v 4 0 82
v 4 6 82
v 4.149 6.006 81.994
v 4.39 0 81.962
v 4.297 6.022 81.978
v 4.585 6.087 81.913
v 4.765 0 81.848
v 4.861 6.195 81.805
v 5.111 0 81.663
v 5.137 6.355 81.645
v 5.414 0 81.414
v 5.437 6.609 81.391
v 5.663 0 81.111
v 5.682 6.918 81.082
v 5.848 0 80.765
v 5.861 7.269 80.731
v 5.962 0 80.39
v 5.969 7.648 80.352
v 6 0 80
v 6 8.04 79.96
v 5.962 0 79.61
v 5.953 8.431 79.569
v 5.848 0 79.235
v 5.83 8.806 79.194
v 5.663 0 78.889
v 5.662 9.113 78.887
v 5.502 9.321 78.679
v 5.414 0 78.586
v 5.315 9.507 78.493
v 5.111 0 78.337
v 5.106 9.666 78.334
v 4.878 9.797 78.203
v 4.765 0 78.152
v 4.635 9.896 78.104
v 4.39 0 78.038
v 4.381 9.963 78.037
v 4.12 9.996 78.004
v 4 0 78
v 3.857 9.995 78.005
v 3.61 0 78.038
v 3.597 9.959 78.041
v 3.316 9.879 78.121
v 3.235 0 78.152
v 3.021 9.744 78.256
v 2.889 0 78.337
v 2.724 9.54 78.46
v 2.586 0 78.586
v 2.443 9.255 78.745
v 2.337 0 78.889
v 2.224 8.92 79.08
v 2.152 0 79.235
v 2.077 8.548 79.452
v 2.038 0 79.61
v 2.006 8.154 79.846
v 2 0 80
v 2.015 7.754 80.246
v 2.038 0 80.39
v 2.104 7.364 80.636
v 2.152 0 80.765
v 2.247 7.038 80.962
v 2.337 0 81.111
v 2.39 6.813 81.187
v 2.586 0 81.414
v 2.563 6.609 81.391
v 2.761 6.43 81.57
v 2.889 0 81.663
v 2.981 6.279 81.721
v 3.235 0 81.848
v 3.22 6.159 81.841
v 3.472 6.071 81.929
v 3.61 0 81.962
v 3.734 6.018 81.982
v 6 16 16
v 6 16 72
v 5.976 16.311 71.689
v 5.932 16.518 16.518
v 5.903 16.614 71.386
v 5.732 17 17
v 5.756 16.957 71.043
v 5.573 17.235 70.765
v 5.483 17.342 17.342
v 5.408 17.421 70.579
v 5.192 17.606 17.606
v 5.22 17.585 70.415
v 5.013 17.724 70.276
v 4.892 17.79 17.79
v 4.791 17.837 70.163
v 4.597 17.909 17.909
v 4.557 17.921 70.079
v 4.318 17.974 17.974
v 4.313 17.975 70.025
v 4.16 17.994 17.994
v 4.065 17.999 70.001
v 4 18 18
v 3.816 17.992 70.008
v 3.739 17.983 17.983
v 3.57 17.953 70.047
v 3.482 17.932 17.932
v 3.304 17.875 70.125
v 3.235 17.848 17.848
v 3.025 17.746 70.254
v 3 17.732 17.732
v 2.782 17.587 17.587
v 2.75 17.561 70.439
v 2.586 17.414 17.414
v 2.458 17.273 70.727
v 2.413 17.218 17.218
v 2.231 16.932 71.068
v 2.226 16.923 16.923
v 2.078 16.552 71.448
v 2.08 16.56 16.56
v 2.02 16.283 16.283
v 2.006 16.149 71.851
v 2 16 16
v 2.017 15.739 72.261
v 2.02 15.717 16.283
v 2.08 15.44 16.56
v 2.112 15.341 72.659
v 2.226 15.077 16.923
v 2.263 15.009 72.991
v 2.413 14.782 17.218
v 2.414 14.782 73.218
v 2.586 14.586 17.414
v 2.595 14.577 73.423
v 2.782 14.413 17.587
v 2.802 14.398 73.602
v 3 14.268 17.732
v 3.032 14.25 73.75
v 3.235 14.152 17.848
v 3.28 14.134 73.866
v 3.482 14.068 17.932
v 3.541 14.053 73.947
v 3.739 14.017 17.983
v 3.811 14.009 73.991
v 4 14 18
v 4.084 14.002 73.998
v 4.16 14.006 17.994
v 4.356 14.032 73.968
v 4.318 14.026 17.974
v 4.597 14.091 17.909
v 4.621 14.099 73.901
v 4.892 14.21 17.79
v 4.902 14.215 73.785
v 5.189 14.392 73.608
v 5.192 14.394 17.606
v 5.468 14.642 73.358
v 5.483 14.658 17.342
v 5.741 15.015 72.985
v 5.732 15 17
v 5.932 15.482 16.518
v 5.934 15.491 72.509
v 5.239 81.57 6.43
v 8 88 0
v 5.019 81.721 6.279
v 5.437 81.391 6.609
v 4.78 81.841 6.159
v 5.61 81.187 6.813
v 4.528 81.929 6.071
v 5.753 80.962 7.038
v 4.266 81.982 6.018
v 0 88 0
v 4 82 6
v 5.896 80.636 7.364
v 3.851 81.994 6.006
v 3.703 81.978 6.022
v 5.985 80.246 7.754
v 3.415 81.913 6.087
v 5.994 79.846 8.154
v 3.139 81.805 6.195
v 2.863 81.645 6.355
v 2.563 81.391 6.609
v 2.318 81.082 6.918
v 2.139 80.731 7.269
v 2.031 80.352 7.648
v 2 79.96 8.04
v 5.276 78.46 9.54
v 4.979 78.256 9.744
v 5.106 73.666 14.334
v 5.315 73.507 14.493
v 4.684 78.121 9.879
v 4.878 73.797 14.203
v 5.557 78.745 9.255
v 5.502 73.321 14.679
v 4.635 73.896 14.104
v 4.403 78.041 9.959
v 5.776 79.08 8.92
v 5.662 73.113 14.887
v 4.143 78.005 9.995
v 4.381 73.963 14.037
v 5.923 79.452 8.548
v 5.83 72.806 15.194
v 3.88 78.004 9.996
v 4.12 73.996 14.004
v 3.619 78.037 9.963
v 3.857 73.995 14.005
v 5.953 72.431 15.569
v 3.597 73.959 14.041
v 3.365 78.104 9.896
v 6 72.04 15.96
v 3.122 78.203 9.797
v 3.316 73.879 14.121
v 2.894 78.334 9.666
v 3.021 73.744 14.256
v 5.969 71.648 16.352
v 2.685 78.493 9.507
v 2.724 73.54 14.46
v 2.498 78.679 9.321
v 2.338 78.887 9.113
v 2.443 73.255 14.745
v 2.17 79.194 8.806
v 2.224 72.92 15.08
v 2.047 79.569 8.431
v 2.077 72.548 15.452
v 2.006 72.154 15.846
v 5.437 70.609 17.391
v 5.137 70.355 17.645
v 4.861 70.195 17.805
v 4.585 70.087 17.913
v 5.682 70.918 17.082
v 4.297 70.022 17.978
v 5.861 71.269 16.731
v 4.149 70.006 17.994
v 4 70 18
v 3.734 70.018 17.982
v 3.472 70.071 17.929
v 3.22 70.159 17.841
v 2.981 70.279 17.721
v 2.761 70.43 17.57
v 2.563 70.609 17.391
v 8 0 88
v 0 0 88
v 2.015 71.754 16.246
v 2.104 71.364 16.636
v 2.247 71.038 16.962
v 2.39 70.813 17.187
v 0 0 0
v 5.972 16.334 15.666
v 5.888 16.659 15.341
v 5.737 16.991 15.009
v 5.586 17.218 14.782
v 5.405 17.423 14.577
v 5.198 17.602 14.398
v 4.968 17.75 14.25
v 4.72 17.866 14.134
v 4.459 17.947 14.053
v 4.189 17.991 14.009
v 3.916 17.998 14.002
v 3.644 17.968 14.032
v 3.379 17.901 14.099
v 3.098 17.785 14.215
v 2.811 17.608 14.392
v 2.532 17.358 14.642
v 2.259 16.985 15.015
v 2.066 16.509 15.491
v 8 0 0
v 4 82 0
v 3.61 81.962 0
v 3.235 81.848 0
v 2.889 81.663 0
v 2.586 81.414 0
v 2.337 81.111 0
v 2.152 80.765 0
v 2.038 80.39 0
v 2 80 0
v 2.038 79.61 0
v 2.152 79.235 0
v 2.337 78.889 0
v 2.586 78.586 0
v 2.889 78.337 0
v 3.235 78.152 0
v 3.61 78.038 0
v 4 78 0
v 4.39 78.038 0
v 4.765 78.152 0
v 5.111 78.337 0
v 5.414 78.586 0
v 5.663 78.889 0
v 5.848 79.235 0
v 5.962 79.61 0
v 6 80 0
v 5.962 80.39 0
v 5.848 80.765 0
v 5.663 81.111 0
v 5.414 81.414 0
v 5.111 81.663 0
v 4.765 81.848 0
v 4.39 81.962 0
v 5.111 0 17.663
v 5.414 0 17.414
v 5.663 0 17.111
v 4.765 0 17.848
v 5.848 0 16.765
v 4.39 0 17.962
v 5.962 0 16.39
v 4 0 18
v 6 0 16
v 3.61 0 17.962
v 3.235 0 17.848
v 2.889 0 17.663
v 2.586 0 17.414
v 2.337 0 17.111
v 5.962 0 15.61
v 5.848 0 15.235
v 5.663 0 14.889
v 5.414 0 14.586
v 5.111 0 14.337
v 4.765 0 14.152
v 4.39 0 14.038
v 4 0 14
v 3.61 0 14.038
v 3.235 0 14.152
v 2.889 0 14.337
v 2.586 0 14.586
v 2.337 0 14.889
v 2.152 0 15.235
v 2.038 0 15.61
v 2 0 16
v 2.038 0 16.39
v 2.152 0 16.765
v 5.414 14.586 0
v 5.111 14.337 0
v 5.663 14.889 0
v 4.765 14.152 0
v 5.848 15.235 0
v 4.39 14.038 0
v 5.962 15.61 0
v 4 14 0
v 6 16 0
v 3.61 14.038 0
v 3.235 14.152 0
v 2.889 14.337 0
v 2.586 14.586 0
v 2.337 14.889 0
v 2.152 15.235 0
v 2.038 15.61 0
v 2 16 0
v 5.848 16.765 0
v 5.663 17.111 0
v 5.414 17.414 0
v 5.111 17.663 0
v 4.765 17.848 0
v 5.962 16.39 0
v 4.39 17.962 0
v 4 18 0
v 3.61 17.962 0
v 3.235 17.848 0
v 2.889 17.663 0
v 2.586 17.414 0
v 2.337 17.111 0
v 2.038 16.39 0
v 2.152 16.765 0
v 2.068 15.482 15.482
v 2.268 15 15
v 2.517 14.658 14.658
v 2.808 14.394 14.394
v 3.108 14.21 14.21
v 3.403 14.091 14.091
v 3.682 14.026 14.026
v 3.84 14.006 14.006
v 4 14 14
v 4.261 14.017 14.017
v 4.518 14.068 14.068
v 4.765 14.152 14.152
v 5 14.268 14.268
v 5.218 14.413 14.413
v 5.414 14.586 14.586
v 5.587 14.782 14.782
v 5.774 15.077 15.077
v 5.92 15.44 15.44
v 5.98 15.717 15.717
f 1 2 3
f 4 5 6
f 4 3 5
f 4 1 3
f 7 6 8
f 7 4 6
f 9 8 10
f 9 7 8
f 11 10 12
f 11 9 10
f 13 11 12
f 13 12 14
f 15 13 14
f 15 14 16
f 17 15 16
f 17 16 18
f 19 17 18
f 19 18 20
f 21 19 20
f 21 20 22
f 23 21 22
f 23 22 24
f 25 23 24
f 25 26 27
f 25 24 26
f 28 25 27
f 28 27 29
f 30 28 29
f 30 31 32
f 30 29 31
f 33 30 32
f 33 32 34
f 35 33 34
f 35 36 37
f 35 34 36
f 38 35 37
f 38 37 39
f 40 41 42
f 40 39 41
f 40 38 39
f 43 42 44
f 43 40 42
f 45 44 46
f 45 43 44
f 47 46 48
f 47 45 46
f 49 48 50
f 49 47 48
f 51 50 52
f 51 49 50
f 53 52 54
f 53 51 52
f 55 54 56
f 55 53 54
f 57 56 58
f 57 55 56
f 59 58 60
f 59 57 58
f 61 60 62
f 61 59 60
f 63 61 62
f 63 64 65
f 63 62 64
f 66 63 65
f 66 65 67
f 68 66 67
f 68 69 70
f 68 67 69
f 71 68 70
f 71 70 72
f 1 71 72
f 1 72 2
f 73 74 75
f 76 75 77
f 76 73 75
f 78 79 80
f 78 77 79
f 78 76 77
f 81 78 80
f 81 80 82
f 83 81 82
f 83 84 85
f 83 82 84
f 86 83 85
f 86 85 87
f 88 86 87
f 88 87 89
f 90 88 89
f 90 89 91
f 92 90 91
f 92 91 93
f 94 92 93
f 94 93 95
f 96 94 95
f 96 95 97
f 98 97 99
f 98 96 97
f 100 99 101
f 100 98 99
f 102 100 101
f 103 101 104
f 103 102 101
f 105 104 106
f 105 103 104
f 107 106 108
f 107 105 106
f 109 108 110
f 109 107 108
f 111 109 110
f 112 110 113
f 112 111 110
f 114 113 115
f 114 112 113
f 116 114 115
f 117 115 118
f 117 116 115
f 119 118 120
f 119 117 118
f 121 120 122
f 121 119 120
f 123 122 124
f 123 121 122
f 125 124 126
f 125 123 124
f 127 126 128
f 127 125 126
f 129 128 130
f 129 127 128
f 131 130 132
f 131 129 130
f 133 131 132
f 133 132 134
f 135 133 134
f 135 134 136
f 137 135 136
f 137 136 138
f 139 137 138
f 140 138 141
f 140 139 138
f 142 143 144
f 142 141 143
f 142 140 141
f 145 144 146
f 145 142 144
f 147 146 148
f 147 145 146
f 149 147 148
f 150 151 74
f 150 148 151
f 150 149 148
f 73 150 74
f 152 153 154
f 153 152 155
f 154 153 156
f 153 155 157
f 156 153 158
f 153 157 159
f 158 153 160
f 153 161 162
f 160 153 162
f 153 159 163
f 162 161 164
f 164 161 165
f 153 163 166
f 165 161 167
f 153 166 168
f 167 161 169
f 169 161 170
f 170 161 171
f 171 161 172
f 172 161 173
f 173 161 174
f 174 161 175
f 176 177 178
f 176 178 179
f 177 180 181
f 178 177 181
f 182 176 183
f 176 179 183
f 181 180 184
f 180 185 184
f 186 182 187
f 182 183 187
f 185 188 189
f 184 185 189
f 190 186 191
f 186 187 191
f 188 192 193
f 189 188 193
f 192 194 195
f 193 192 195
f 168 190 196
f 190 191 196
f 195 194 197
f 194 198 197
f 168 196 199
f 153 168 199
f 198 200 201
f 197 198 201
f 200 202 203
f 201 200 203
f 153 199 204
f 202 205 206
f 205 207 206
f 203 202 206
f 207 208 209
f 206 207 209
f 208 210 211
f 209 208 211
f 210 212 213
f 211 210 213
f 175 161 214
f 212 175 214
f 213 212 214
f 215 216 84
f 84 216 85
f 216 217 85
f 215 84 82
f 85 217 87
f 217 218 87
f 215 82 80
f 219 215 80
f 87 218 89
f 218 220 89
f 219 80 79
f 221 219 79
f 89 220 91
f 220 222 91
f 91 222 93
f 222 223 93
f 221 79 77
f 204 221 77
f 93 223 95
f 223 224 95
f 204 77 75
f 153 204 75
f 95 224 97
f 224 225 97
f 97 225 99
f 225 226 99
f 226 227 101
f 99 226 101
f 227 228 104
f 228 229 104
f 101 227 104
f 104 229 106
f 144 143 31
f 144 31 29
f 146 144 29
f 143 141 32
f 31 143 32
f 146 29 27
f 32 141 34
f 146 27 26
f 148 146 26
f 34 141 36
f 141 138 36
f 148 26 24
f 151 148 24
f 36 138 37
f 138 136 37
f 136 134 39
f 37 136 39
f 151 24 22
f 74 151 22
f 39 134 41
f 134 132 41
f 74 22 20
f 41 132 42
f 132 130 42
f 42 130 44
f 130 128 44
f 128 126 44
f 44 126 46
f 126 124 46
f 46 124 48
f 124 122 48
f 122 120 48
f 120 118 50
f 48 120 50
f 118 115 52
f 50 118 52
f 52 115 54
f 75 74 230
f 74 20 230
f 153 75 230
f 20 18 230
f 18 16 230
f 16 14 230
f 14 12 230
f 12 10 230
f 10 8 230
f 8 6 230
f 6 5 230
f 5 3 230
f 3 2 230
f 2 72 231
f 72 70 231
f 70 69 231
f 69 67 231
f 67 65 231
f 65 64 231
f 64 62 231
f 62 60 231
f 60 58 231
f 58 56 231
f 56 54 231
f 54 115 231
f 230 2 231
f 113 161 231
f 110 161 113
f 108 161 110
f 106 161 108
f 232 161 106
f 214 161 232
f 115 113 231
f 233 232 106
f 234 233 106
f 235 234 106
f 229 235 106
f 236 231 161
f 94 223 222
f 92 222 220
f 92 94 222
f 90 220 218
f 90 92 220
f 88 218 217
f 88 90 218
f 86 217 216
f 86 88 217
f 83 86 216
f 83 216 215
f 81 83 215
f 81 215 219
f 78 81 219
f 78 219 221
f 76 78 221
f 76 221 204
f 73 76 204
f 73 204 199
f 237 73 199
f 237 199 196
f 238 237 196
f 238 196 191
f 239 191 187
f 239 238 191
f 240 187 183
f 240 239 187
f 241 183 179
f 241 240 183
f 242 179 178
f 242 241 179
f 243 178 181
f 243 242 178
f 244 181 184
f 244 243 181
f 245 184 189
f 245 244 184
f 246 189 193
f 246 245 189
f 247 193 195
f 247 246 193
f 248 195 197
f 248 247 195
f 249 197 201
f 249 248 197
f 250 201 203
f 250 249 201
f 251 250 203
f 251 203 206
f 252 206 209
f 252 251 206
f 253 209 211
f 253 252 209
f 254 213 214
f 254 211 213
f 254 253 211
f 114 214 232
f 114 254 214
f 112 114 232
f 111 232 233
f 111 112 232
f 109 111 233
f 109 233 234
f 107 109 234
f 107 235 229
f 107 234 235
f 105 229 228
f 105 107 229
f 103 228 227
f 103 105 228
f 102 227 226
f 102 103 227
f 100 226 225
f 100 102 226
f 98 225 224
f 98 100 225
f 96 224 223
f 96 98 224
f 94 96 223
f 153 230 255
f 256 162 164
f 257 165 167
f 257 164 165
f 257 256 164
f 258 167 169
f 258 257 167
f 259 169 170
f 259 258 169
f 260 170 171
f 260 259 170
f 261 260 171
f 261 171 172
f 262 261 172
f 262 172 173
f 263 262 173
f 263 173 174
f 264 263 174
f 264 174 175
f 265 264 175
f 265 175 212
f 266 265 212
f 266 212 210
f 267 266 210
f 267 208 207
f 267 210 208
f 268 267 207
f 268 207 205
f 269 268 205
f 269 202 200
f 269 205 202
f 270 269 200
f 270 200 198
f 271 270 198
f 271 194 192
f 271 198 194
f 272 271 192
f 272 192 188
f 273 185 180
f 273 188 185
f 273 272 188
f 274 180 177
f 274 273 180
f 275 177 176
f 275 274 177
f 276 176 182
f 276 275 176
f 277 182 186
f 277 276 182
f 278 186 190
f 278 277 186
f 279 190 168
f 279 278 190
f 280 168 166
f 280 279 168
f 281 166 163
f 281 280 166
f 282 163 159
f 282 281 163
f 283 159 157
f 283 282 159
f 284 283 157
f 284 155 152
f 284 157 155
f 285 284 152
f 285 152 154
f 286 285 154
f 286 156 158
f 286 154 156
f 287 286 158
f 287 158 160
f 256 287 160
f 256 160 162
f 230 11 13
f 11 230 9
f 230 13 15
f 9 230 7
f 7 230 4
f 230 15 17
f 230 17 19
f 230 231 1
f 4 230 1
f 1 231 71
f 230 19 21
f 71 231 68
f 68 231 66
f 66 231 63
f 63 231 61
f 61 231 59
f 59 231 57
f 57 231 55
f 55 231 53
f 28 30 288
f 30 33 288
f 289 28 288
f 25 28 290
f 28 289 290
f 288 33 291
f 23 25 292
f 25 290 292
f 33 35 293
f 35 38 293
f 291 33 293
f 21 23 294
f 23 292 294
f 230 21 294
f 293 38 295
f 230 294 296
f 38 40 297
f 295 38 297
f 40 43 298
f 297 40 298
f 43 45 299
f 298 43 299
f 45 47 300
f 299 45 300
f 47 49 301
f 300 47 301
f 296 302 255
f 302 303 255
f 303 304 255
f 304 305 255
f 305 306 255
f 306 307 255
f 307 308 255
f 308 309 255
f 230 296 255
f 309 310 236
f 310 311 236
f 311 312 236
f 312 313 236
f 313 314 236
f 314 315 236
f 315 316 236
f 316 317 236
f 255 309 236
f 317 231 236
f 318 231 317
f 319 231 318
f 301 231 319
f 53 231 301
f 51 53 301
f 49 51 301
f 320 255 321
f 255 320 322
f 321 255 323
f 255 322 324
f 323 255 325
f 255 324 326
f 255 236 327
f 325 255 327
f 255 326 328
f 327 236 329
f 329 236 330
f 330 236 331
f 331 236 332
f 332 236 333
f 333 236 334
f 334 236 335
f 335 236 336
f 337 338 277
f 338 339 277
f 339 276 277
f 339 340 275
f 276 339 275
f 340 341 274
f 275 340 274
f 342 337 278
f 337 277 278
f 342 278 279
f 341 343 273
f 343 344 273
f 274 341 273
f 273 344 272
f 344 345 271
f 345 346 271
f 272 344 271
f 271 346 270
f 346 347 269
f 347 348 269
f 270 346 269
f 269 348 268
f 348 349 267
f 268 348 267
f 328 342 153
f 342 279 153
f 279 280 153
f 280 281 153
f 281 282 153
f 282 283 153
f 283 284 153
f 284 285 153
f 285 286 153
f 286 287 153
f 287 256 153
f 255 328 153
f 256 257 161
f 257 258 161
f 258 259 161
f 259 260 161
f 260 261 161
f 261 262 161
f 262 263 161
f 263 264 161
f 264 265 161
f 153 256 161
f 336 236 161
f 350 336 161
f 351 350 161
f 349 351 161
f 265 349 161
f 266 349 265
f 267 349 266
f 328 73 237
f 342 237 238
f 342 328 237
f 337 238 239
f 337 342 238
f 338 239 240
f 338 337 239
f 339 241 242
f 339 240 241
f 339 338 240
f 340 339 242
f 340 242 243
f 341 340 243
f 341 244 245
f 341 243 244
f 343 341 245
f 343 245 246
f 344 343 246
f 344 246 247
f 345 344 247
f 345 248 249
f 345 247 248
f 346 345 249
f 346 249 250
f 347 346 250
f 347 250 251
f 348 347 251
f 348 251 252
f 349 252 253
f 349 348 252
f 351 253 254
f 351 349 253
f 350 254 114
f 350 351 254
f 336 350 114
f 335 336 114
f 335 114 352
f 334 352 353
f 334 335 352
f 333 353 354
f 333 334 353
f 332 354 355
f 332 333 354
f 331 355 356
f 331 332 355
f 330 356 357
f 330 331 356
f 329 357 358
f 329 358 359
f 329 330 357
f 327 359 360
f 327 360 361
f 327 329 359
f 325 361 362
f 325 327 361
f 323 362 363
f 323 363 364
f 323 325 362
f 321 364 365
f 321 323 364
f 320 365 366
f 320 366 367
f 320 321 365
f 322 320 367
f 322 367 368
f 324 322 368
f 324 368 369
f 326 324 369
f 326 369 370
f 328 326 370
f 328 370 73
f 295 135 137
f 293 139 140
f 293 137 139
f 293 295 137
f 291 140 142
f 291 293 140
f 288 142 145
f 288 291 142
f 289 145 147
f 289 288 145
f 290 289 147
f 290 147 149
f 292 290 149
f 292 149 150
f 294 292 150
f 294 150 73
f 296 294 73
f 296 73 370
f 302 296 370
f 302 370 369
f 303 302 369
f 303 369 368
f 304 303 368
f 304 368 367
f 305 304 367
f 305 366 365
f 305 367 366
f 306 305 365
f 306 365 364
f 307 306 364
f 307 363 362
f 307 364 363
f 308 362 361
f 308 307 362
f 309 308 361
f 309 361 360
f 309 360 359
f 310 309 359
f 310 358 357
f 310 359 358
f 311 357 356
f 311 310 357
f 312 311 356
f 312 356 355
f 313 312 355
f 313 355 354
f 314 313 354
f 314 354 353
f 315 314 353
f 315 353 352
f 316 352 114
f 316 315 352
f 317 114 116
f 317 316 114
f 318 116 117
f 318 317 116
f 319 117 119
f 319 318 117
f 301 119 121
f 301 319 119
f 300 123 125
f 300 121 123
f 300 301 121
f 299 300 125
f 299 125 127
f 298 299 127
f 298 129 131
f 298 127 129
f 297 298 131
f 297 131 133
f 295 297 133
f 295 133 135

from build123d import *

# Parameters (mm, degrees)
BOSS_EXTRUDE1_DEPTH = 8
SKETCH2_R           = 2
CUT_EXTRUDE1_DEPTH  = 125.707658145
SKETCH3_R           = 2
CUT_EXTRUDE2_DEPTH  = 125.707658145


with BuildPart() as part:
    # Sketch1 → Boss-Extrude1 (new body)
    with BuildSketch(Plane(origin=(0, 0, 0), x_dir=(0, 0, -1), z_dir=(1, 0, 0))):
        Polygon((-88, 0), (0, 0), (0, 88), align=None)
    extrude(amount=BOSS_EXTRUDE1_DEPTH)

    # Sketch2 → Cut-Extrude1 (cut, through all)
    with BuildSketch(Plane(origin=(0, 0, 0), x_dir=(1, 0, 0), z_dir=(0, 1, 0))):
        with Locations(Location((4, -16, 0), (0, 0, 270))):
            Circle(SKETCH2_R)
        with Locations(Location((4, -80, 0), (0, 0, 270))):
            Circle(SKETCH2_R)
    extrude(amount=CUT_EXTRUDE1_DEPTH, mode=Mode.SUBTRACT)

    # Sketch3 → Cut-Extrude2 (cut, through all)
    with BuildSketch(Plane.XY):
        with Locations((4, 16)):
            Circle(SKETCH3_R)
        with Locations(Location((4, 80, 0), (0, 0, 90))):
            Circle(SKETCH3_R)
    extrude(amount=CUT_EXTRUDE2_DEPTH, mode=Mode.SUBTRACT)


solid = part.part
